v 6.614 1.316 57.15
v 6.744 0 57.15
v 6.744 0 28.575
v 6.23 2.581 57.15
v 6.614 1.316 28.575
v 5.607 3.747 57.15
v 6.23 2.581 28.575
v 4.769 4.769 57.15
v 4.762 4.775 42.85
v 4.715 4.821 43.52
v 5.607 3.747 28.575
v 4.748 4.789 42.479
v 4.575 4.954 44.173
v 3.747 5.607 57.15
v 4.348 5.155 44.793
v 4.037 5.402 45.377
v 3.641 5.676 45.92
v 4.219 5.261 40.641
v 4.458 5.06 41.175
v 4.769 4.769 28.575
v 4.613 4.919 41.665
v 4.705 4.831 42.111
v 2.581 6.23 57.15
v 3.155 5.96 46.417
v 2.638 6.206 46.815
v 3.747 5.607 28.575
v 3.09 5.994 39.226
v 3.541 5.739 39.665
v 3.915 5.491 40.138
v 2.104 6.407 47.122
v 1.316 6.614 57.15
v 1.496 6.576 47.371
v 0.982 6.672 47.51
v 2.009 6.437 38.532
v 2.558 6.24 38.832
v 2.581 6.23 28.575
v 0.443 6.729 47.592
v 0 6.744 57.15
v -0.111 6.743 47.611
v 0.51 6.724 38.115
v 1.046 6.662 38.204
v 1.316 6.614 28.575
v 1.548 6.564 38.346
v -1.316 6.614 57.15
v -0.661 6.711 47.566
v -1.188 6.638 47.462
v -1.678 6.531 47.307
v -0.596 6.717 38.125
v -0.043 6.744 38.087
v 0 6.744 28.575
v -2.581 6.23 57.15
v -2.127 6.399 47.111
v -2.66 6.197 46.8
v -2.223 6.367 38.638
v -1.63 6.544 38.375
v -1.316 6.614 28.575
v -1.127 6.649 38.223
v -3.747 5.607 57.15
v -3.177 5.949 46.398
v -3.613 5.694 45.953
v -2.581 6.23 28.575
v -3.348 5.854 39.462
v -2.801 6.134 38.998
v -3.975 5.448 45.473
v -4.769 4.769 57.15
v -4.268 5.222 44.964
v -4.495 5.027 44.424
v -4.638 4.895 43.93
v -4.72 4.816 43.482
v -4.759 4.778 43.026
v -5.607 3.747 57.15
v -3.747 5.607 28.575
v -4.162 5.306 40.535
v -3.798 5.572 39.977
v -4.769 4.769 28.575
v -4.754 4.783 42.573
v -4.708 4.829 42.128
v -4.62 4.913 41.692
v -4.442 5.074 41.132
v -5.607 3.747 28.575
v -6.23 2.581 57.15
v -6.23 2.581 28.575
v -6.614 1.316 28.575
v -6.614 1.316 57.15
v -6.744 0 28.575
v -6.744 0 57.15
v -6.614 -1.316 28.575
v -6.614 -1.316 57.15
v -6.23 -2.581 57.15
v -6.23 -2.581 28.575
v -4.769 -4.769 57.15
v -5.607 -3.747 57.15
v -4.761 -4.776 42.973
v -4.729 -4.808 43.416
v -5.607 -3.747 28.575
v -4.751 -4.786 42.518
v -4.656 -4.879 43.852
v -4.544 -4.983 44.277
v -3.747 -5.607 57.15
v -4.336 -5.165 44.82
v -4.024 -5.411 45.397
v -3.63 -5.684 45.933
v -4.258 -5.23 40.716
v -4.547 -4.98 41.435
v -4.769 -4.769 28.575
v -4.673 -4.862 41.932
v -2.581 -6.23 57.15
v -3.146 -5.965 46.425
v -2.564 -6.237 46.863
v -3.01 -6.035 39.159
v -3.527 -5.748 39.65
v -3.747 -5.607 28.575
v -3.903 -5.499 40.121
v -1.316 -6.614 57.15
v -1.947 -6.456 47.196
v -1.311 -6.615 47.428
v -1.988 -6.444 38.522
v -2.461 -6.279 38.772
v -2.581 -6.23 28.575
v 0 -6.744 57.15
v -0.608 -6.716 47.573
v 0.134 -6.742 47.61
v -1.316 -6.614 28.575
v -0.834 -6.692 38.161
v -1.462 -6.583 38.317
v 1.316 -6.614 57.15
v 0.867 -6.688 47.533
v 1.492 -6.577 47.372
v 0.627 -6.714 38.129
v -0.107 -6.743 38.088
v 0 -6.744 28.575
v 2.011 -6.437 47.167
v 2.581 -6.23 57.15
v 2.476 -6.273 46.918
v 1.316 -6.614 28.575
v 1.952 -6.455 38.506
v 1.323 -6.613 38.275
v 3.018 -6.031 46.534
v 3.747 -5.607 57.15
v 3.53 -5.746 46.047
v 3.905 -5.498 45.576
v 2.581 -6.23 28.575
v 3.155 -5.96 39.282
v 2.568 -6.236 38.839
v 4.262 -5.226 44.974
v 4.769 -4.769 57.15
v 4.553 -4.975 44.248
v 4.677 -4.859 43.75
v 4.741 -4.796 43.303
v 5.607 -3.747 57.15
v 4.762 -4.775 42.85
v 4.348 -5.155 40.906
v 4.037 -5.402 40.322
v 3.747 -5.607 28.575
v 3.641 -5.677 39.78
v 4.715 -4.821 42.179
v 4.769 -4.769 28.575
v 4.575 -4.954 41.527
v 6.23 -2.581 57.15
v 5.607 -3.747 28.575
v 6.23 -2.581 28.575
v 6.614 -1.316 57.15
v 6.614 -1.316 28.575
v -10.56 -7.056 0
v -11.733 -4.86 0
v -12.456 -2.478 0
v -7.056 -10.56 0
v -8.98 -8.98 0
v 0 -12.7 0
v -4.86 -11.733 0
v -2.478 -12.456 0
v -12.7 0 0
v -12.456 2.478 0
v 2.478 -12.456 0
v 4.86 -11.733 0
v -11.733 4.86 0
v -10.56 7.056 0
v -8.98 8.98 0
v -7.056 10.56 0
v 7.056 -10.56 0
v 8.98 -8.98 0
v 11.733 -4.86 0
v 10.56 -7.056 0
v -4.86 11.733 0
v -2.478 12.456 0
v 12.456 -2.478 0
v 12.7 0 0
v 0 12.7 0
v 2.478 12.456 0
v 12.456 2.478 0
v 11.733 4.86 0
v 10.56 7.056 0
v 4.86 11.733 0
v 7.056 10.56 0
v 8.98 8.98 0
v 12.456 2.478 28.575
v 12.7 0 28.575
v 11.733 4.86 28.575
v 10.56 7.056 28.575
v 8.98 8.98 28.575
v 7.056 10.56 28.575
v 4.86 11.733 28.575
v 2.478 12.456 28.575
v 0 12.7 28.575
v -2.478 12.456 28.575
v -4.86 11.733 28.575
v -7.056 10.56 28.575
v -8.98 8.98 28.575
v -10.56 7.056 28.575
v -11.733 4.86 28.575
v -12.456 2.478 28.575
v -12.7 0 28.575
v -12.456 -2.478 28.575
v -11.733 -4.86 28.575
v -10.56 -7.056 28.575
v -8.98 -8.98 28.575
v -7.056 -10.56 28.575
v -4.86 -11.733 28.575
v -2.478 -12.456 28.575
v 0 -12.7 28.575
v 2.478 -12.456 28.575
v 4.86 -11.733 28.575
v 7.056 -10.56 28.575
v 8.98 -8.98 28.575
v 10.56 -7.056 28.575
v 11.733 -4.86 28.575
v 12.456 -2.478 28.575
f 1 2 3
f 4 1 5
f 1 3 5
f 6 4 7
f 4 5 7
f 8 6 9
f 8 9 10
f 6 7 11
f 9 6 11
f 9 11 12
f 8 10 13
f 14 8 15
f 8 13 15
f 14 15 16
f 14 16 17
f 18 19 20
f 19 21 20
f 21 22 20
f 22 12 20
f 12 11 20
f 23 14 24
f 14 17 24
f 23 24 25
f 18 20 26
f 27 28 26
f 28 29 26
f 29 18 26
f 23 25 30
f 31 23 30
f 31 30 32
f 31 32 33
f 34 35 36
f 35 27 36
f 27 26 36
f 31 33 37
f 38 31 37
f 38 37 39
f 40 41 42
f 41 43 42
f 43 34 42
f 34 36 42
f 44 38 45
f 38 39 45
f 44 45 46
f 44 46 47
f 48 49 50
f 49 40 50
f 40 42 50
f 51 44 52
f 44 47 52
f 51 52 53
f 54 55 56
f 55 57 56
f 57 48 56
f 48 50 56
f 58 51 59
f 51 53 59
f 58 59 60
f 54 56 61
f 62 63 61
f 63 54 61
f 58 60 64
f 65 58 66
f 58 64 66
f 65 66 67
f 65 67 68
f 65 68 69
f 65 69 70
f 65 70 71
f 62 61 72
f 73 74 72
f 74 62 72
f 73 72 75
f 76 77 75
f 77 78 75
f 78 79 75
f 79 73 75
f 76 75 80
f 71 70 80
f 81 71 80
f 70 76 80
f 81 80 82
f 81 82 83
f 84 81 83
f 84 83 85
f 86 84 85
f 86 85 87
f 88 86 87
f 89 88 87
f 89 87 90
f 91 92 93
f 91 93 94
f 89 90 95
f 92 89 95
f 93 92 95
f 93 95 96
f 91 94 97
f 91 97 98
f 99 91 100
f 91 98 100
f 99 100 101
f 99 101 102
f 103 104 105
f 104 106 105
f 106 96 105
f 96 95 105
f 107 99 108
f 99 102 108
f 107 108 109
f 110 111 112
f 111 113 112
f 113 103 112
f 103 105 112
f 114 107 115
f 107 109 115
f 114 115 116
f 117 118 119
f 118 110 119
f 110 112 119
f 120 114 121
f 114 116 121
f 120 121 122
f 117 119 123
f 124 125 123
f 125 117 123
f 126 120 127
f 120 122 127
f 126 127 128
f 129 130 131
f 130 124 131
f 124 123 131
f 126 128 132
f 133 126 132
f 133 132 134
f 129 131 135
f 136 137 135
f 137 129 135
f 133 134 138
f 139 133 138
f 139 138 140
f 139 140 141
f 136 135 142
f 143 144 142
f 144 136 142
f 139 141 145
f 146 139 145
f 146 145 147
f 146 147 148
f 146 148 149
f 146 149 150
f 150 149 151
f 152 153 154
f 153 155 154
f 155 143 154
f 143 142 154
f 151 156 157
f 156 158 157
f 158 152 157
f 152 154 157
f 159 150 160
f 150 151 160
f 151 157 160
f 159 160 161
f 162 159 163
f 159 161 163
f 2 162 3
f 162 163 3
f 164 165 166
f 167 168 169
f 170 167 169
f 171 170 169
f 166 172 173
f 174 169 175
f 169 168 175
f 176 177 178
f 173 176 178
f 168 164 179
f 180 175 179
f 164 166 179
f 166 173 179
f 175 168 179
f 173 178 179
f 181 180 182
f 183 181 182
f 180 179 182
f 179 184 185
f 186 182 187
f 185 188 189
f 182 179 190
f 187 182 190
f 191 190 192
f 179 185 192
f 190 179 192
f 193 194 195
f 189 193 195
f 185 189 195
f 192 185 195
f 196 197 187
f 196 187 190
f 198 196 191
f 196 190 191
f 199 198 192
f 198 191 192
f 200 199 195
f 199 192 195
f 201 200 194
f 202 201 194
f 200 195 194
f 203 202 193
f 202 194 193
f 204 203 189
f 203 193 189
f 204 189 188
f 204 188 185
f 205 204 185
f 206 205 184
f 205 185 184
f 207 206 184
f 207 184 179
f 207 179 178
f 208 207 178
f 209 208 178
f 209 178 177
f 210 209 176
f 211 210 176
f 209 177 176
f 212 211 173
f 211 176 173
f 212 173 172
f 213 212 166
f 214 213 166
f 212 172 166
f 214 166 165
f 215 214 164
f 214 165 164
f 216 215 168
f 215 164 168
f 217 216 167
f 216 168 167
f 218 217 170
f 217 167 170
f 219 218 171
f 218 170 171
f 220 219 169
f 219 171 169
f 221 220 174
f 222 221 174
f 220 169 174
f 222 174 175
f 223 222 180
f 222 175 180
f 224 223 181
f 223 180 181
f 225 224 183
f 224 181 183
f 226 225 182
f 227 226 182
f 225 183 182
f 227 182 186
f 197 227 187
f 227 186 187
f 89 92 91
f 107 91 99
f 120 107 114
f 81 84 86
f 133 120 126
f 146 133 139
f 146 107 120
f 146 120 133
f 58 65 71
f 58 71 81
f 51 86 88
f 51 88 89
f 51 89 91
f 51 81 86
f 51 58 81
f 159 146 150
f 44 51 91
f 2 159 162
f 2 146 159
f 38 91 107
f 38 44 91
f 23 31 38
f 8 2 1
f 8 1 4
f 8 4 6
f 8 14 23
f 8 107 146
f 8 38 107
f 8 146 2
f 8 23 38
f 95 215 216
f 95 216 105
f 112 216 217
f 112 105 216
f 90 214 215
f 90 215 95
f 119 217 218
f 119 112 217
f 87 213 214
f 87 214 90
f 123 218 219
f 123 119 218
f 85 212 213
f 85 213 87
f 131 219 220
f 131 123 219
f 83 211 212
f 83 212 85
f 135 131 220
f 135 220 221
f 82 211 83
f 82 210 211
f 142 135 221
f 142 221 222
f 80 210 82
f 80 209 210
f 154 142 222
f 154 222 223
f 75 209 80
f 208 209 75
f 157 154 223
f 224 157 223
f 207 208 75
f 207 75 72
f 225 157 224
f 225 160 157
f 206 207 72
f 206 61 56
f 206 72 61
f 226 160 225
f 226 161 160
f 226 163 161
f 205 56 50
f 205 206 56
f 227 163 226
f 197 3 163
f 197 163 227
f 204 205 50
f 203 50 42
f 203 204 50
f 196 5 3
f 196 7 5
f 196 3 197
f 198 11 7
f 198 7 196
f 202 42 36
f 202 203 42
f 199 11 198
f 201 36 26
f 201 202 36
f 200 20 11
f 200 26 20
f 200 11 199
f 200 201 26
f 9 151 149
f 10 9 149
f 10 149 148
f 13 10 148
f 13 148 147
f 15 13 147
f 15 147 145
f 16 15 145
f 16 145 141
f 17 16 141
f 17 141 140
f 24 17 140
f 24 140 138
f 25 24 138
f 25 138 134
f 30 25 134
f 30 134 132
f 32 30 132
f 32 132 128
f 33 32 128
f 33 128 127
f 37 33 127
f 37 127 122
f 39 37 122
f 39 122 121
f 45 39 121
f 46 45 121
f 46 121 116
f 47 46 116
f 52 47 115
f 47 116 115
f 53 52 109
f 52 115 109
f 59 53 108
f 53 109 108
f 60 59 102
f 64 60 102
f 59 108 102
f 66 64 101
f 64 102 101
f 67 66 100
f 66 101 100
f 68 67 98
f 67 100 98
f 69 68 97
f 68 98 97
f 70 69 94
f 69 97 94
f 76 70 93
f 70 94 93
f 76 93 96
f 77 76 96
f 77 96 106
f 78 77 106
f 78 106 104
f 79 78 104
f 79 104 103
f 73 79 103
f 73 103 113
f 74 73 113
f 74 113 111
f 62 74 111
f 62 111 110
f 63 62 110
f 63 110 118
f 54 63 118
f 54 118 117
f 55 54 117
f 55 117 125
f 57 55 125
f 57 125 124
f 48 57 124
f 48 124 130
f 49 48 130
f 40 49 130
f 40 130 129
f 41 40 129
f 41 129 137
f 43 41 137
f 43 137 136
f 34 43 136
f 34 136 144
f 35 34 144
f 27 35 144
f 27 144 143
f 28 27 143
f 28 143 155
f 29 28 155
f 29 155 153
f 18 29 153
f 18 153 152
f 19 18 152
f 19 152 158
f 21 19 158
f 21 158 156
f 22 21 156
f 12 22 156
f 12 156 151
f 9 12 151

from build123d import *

# Parameters (mm, degrees)
F0_R     = 12.7
F1_DEPTH = 28.575
F2_R     = 6.7437
F3_DEPTH = 28.575
F5_R     = 4.7625
F6_DEPTH = 19.4447


with BuildPart() as f1:
    # F0 (on Top) → F1 (new body)
    with BuildSketch(Plane.XY):
        Circle(F0_R)
    extrude(amount=F1_DEPTH)

    # F2 (on face) → F3 (join)
    with BuildSketch(Plane.XY.offset(28.575)):
        Circle(F2_R)
    extrude(amount=F3_DEPTH)

    # F5 (on offset) → F6 (cut, through all)
    with BuildSketch(Plane.XZ.offset(6.7437)):
        with Locations((0, 42.8498)):
            Circle(F5_R)
    extrude(amount=-F6_DEPTH, mode=Mode.SUBTRACT)


solid = f1.part
